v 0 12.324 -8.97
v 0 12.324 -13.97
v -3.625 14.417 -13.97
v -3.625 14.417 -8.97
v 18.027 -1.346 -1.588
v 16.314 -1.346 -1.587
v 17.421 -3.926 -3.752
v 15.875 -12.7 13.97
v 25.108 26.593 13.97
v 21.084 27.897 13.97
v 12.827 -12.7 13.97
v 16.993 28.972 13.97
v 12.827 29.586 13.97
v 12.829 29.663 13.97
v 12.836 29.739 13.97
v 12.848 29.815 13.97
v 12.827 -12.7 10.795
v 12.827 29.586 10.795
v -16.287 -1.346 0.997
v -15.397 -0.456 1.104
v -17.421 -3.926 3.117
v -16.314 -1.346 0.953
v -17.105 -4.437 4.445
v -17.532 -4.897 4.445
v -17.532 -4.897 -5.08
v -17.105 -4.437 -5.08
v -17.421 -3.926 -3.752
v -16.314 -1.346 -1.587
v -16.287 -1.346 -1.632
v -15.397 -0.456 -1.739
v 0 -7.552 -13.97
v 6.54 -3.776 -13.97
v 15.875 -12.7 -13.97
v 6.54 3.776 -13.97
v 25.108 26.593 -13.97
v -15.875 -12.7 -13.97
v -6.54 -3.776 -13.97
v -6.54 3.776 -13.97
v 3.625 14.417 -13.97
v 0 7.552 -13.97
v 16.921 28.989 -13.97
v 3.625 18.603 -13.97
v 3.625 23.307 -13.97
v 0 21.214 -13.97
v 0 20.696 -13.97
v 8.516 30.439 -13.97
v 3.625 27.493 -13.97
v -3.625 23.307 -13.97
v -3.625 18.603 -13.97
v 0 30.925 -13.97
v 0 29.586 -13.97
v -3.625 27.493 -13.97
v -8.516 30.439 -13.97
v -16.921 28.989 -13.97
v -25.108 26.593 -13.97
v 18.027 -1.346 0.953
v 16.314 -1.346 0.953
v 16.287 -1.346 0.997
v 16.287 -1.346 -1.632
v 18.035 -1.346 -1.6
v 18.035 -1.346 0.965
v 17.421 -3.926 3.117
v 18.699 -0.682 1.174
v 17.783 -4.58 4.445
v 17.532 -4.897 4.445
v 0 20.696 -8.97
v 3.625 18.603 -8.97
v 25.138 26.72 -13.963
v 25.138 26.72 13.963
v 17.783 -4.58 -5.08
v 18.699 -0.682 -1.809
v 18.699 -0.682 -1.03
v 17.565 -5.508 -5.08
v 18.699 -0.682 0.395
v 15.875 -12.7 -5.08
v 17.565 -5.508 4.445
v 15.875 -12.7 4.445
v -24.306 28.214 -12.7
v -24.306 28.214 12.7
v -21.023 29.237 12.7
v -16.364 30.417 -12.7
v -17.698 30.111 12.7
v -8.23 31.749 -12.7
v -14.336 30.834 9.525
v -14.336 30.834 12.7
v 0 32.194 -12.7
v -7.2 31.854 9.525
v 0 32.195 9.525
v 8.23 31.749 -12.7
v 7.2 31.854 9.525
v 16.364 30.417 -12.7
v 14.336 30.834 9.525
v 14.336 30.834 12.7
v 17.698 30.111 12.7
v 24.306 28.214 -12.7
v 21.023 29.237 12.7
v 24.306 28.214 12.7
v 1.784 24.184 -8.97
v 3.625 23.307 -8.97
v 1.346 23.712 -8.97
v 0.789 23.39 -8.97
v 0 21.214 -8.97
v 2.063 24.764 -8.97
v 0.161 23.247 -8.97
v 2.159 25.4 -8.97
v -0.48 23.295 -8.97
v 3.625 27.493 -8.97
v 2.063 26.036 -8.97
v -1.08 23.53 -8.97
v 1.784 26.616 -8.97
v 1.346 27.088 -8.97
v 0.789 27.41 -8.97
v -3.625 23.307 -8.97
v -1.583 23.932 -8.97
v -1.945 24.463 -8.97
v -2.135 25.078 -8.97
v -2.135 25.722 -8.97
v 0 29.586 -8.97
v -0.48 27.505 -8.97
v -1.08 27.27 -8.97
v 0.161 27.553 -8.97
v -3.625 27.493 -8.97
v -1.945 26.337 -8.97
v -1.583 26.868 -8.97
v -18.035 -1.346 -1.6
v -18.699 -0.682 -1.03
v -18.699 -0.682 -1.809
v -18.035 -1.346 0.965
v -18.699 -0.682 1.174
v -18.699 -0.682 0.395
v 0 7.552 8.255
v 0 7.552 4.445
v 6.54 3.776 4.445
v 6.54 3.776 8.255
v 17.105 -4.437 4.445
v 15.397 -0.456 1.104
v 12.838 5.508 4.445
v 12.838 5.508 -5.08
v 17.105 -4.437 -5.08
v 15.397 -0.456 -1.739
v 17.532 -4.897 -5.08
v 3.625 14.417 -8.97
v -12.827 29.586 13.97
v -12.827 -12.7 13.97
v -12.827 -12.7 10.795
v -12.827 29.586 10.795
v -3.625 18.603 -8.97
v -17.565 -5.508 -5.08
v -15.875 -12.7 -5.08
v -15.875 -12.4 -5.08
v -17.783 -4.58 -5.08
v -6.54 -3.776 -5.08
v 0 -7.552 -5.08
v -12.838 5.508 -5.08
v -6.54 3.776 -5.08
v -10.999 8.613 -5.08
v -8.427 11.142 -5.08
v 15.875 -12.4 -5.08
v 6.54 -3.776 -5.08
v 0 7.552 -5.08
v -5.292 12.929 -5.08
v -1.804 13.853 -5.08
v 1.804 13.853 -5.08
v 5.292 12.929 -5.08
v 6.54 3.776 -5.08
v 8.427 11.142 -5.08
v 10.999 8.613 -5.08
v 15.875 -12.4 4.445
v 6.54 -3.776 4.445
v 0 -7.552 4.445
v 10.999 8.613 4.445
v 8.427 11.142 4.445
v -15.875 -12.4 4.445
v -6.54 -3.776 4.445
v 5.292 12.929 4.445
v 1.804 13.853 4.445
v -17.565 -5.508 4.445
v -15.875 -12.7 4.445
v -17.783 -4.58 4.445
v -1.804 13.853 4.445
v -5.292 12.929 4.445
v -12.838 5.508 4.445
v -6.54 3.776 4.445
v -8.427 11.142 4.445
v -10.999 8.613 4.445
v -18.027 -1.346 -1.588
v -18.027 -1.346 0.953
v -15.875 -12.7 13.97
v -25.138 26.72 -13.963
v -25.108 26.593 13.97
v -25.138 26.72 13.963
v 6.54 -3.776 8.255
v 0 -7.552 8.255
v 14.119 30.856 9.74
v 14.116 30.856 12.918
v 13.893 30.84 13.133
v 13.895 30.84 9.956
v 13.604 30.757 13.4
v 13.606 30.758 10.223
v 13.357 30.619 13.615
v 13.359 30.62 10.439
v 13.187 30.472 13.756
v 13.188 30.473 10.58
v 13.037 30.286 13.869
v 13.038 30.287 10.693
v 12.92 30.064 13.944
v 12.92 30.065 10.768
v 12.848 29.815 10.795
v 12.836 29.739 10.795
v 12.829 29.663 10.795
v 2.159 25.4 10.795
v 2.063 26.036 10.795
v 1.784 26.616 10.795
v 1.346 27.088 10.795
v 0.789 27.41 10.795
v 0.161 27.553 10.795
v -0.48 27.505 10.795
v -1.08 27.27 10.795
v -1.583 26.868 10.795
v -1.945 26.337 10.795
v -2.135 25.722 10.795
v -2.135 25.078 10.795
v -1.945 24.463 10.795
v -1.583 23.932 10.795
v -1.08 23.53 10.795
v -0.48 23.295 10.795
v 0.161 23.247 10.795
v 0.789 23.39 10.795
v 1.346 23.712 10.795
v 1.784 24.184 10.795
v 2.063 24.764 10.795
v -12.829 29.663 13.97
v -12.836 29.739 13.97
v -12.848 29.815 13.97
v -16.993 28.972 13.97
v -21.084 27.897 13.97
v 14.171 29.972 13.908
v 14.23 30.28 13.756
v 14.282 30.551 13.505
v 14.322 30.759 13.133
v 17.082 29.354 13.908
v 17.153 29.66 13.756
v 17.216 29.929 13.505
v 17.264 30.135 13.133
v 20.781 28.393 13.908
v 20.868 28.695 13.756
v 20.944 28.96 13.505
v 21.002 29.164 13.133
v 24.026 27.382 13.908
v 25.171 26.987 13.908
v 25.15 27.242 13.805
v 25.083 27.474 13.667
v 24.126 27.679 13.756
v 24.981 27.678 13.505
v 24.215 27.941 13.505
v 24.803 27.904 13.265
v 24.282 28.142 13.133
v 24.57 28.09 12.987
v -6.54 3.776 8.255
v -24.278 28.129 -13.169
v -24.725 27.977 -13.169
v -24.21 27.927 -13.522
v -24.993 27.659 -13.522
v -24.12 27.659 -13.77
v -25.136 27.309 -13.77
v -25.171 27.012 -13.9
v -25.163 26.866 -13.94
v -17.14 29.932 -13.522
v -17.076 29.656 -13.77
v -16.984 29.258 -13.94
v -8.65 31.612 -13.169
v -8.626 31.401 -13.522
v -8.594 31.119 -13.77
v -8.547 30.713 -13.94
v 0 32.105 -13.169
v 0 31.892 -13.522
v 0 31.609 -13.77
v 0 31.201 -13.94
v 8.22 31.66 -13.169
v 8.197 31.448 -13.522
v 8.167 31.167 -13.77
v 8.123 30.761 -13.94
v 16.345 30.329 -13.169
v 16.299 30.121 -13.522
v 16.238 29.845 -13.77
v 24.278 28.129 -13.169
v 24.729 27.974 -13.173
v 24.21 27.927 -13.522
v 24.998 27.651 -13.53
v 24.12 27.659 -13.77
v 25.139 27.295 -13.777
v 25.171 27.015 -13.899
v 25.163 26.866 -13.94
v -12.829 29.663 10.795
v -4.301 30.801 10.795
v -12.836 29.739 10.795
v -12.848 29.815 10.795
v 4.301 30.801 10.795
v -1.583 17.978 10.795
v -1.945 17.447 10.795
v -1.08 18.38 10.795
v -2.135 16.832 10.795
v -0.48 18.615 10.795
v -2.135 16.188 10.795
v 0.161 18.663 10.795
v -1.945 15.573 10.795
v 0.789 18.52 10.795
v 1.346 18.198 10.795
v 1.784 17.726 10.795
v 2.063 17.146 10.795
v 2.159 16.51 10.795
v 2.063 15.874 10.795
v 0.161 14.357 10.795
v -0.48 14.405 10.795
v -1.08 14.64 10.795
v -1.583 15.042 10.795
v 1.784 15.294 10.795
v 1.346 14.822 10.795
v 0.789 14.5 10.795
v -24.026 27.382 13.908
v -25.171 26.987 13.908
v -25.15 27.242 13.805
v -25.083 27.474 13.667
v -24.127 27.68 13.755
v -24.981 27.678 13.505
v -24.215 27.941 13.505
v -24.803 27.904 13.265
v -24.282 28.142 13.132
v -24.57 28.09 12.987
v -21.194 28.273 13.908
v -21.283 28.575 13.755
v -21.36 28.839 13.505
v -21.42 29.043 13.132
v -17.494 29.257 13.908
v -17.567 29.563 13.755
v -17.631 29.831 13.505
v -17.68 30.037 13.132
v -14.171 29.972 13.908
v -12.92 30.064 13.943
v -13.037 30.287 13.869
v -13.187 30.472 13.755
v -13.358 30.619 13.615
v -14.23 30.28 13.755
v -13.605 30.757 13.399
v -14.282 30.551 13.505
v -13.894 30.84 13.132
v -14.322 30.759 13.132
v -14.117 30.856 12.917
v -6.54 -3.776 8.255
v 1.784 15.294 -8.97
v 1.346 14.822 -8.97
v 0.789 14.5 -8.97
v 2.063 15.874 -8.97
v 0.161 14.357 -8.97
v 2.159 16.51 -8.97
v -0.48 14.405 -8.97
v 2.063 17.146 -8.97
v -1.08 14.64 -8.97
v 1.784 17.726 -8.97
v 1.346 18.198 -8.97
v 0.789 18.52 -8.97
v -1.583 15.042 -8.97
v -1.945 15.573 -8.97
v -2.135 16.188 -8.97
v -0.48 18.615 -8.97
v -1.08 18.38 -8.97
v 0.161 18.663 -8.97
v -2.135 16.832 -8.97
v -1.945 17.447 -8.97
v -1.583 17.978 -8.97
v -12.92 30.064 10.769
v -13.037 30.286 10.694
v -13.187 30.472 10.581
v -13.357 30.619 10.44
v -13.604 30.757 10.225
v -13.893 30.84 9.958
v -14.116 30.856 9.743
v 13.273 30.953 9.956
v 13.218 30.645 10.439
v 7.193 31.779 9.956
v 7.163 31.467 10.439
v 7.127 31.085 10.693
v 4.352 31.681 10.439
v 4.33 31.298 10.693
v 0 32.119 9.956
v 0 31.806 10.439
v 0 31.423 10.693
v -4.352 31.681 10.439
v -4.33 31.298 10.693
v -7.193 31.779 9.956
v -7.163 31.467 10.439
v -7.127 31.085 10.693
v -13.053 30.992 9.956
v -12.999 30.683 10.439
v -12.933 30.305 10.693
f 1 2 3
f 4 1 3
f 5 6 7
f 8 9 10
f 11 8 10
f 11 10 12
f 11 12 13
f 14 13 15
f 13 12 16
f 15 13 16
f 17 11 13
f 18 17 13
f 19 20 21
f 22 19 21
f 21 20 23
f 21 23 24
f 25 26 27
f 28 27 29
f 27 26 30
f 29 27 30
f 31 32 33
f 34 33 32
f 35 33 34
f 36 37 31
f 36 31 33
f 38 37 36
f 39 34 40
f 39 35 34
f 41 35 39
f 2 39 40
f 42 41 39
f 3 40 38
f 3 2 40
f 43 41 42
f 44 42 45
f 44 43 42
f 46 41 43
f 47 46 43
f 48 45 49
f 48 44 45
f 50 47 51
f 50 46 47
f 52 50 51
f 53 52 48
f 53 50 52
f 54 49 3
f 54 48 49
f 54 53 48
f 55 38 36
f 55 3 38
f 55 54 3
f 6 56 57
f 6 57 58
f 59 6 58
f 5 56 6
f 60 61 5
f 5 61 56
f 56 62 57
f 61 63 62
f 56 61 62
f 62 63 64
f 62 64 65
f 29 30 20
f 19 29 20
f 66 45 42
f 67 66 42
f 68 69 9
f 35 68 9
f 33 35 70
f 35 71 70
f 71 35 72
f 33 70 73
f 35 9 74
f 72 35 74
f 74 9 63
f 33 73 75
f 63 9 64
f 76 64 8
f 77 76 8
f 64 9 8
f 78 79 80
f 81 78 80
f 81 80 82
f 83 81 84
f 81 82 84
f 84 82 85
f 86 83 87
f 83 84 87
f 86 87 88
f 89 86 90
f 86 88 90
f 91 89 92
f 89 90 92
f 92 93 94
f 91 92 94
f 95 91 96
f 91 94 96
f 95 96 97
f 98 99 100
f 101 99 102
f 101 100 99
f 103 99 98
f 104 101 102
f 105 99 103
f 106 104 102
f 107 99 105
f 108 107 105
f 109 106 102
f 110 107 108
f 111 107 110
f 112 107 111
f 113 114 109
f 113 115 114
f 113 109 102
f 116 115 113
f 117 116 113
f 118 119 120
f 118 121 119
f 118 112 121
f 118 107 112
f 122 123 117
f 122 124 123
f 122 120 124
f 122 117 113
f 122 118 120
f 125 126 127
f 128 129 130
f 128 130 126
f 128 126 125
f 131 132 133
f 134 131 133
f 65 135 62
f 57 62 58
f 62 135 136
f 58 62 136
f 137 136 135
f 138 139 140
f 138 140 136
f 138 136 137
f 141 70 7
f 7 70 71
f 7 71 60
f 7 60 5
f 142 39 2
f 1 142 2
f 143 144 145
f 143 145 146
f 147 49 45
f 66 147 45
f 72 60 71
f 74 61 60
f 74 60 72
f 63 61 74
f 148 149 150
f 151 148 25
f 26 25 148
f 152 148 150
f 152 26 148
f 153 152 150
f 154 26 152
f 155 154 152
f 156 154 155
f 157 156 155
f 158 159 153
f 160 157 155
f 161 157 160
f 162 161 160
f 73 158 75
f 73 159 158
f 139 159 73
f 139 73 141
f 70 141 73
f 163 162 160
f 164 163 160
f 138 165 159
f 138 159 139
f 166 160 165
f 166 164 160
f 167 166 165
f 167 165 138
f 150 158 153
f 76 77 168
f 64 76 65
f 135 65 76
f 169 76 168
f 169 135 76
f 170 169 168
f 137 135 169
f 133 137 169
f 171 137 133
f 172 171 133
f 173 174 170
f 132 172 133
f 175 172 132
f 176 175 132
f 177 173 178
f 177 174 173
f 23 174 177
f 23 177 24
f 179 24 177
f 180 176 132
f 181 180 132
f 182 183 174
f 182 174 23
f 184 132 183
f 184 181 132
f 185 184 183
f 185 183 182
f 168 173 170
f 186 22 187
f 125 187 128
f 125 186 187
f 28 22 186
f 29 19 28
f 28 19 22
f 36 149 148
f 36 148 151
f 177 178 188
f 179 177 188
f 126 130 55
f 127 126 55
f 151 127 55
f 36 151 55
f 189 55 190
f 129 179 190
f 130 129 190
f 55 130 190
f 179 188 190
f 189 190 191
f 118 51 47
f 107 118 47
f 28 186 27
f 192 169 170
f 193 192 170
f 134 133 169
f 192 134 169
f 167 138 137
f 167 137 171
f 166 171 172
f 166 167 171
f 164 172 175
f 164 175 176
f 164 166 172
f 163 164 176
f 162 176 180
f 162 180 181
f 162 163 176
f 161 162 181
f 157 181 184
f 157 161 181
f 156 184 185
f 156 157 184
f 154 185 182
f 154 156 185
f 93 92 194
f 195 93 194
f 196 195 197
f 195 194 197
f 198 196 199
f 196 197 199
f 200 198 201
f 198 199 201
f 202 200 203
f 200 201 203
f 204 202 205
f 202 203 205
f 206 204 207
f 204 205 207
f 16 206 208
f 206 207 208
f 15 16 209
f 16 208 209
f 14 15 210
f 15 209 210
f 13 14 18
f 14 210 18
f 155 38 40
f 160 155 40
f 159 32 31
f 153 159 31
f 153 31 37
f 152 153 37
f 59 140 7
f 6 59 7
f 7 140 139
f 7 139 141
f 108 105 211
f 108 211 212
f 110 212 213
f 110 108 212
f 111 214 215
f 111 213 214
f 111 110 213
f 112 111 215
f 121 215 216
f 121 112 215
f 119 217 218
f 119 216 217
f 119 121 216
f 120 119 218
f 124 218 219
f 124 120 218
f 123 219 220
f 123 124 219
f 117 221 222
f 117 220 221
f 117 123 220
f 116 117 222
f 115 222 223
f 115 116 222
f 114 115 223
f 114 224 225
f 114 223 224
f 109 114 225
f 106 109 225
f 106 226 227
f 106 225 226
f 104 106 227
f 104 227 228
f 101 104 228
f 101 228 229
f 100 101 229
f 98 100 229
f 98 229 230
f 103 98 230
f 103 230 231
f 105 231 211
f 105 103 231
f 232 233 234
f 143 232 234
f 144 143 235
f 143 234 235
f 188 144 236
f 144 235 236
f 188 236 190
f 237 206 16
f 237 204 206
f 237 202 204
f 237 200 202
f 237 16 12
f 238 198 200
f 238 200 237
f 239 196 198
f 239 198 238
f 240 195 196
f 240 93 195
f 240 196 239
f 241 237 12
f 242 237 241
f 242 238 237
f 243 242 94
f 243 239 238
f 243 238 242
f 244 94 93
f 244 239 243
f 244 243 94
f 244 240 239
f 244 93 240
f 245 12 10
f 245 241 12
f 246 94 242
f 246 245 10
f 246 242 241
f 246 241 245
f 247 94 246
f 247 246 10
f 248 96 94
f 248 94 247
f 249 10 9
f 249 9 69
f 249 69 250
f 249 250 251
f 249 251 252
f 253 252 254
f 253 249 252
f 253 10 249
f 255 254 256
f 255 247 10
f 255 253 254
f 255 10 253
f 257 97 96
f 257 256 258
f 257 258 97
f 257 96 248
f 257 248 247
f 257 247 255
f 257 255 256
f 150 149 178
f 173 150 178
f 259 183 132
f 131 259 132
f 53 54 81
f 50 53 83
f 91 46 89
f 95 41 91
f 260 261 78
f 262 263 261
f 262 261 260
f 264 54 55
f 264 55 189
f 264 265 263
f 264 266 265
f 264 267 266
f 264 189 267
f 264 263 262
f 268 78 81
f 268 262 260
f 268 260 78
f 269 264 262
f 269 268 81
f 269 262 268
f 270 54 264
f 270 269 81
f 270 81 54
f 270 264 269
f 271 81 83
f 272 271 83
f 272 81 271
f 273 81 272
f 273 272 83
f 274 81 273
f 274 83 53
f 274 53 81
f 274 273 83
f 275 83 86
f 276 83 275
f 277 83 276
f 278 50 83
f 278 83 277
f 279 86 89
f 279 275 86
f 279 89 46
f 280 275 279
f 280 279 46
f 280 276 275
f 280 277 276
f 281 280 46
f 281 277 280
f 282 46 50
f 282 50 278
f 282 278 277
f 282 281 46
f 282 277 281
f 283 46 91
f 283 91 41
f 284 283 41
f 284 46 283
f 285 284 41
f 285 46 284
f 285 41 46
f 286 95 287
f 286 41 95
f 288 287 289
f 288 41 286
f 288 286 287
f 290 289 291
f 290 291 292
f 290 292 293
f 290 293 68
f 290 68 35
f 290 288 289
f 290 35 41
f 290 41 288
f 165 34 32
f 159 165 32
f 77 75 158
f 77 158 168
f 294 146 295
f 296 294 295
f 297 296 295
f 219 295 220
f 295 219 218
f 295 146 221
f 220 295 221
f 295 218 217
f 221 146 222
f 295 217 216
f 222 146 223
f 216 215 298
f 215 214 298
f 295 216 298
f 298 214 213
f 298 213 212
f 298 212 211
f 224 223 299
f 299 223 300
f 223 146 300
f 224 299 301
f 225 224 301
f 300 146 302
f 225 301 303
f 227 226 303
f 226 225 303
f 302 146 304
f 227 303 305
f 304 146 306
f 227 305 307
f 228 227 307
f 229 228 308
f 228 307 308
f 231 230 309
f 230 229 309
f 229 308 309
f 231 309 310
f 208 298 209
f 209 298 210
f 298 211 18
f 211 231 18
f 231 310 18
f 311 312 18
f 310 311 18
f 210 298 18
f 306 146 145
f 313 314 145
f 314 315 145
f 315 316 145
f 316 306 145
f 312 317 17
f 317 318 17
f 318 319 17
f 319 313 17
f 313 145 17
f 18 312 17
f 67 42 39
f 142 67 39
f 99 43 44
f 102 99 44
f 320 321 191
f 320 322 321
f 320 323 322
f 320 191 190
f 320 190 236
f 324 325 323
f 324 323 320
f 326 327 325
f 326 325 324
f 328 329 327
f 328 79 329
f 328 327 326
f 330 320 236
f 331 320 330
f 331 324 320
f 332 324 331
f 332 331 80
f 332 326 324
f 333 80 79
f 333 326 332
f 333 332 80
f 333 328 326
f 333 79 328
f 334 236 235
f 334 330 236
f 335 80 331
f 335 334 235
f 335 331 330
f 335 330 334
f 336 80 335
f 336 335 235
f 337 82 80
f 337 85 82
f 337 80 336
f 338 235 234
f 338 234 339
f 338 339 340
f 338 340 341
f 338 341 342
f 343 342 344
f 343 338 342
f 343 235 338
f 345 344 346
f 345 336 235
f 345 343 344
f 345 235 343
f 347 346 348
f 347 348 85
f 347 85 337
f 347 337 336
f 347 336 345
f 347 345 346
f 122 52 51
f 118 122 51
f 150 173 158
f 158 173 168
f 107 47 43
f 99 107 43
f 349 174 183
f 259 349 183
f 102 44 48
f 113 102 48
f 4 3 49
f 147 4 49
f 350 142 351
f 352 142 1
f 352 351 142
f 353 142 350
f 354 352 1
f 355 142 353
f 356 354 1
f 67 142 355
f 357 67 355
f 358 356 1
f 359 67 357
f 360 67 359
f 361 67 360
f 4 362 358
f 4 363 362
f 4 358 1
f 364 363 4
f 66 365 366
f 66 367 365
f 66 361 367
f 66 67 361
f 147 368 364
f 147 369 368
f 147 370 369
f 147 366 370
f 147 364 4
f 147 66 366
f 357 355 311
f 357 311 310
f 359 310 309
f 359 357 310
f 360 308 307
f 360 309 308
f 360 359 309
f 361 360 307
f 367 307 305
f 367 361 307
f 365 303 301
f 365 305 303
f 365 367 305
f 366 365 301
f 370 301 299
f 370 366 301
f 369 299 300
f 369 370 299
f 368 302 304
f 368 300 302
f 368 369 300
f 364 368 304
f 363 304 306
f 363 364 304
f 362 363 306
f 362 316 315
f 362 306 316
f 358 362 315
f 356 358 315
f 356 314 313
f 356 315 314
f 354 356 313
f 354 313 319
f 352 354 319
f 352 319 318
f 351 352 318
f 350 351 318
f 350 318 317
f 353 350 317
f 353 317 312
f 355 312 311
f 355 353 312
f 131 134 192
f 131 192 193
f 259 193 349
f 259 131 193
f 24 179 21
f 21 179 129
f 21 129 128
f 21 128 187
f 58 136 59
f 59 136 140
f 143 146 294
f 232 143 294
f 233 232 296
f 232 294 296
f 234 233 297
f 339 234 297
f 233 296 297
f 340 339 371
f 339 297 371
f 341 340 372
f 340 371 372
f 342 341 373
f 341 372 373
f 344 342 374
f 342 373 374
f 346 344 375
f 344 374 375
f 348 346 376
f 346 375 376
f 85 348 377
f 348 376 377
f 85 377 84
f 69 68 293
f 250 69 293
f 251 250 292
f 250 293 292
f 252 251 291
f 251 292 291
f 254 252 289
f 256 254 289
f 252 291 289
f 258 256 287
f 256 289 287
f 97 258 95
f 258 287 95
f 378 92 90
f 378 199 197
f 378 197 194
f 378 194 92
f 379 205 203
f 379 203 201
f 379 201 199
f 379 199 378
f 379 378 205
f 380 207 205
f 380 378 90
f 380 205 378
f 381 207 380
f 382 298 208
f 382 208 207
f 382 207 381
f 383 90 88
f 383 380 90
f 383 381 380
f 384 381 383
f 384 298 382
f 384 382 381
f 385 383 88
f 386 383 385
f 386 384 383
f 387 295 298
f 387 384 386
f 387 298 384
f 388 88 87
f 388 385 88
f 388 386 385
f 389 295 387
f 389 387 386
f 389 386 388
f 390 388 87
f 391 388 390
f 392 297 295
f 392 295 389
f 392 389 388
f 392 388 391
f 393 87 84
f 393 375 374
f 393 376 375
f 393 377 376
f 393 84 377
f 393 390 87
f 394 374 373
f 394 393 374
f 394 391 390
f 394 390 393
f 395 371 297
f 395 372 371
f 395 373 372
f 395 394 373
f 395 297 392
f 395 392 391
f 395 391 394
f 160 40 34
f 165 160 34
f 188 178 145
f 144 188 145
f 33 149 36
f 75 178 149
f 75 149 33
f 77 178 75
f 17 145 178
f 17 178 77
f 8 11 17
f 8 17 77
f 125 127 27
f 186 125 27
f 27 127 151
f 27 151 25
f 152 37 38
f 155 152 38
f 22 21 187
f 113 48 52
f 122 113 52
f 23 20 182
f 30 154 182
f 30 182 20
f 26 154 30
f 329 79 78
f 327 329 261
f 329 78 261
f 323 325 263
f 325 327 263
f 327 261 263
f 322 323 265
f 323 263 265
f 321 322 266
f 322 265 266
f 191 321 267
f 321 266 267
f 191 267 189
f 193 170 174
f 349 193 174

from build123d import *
from OCP.BRepFilletAPI import BRepFilletAPI_MakeChamfer

# Parameters (mm, degrees)
BOSS_EXTRUDE1_DEPTH     = 13.97
SKETCH5_W               = 25.654
SKETCH5_H               = 76.2
CUT_EXTRUDE3_DEPTH      = 3.175
CUT_EXTRUDE5_DEPTH      = 48.905647425
CUT_EXTRUDE5_DEPTH_BACK = 48.905647425
SKETCH8_R               = 2.159
SKETCH6_W               = 9.525
SKETCH6_H               = 13.97
CUT_EXTRUDE4_DEPTH      = 9.525
CUT_EXTRUDE1_DEPTH      = 22.225
CUT_EXTRUDE6_DEPTH      = 5
CUT_EXTRUDE8_DEPTH      = 44.32212749
CUT_EXTRUDE8_DEPTH_BACK = 44.32212749
CHAMFER1_SIZE           = 0.682114001
CHAMFER1_SIZE_2         = 0.508
CHAMFER1_SIZE_3         = 0.603255048
CHAMFER2_SIZE           = 0.508
CHAMFER2_SIZE2          = 0.71158035
CHAMFER2_SIZE2_2        = 0.968183523
FILLET2_R               = 1.27
SKETCH11_W              = 31.75
SKETCH11_H              = 9.525
BOSS_EXTRUDE3_DEPTH     = 0.3


with BuildPart() as part:
    # Sketch1 → Boss-Extrude1 (new, symmetric)
    with BuildSketch(Plane.XY):
        with BuildLine():
            Line((-15.875, -12.7), (-25.4, 27.836548969))
            ThreePointArc((-25.4, 27.836548969), (0, 32.1945), (25.4, 27.836548969))
            Line((25.4, 27.836548969), (15.875, -12.7))
            Line((15.875, -12.7), (-15.875, -12.7))
        make_face()
    extrude(amount=BOSS_EXTRUDE1_DEPTH, both=True)

    # Sketch5 → Cut-Extrude3 (cut)
    with BuildSketch(Plane.XY.offset(13.97)):
        with Locations((0, 25.4)):
            Rectangle(SKETCH5_W, SKETCH5_H)
    extrude(amount=-CUT_EXTRUDE3_DEPTH, mode=Mode.SUBTRACT)

    # Sketch8 → Cut-Extrude5 (cut, two sides: drawn at the far end of the back side and taken through both)
    with BuildSketch(Plane.XY.offset(10.795).offset(-CUT_EXTRUDE5_DEPTH_BACK)):
        with Locations((0, 16.51)):
            Circle(SKETCH8_R)
        with Locations((0, 25.4)):
            Circle(SKETCH8_R)
    extrude(amount=CUT_EXTRUDE5_DEPTH + CUT_EXTRUDE5_DEPTH_BACK, mode=Mode.SUBTRACT)

    # Sketch6 → Cut-Revolve2 (revolve, cut)
    with BuildSketch(Plane(origin=(0, 0, 0), x_dir=(0, 0, -1), z_dir=(1, 0, 0))):
        with Locations((0.3175, 6.985)):
            Rectangle(SKETCH6_W, SKETCH6_H)
    revolve(axis=Axis((0, 0, 20.955), (0, 0, -1)), mode=Mode.SUBTRACT)

    # Sketch7 → Cut-Extrude4 (cut)
    with BuildSketch(Plane(origin=(0, 0, -5.08), x_dir=(-1, 0, 0), z_dir=(0, 0, -1))):
        with BuildLine():
            Line((12.838226341, 5.508252391), (17.564867483, -5.508252391))
            Line((17.564867483, -5.508252391), (15.875, -12.7))
            Line((15.875, -12.7), (-15.875, -12.7))
            Line((-15.875, -12.7), (-17.564867483, -5.508252391))
            Line((-17.564867483, -5.508252391), (-12.838226341, 5.508252391))
            ThreePointArc((-12.838226341, 5.508252391), (0, 13.97), (12.838226341, 5.508252391))
        make_face()
    extrude(amount=-CUT_EXTRUDE4_DEPTH, mode=Mode.SUBTRACT)

    # Sketch3 → Cut-Extrude1 (cut)
    with BuildSketch(Plane(origin=(0, 0, -13.97), x_dir=(-1, 0, 0), z_dir=(0, 0, -1))):
        Polygon((6.5405, -3.776159436), (6.5405, 3.776159436), (0, 7.552318871), (-6.5405, 3.776159436), (-6.5405, -3.776159436), (0, -7.552318871), align=None)
    extrude(amount=-CUT_EXTRUDE1_DEPTH, mode=Mode.SUBTRACT)

    # Sketch9 → Cut-Extrude6 (cut)
    with BuildSketch(Plane(origin=(0, 0, -13.97), x_dir=(-1, 0, 0), z_dir=(0, 0, -1))):
        Polygon((3.625, 23.307105274), (3.625, 27.492894726), (0, 29.585789452), (-3.625, 27.492894726), (-3.625, 23.307105274), (0, 21.214210548), align=None)
        Polygon((3.625, 18.602894726), (0, 20.695789452), (-3.625, 18.602894726), (-3.625, 14.417105274), (0, 12.324210548), (3.625, 14.417105274), align=None)
    extrude(amount=-CUT_EXTRUDE6_DEPTH, mode=Mode.SUBTRACT)

    # Sketch10 → Cut-Extrude8 (cut, two sides: drawn at the far end of the back side and taken through both)
    with BuildSketch(Plane(origin=(0, 0, 0), x_dir=(0, 0, -1), z_dir=(1, 0, 0)).offset(-CUT_EXTRUDE8_DEPTH_BACK)):
        Polygon((-4.445, -5.508252391), (-0.9525, -1.346052969), (1.5875, -1.346052969), (5.08, -5.508252391), align=None)
    extrude(amount=CUT_EXTRUDE8_DEPTH + CUT_EXTRUDE8_DEPTH_BACK, mode=Mode.SUBTRACT)

    # Chamfer1
    # the kernel refuses this chamfer: 0.682114001, 0.603255048, 0.508 mm, written as the material it takes off along each edge
    with BuildSketch(Plane(origin=(-18.54287253, -1.346052969, -3.351137705), x_dir=(-0.24852335816266743, 0.968625903250347, 0), z_dir=(0, 0, 1))) as chamfer1_piece_1_section:
        Polygon((CHAMFER1_SIZE * 0.999792559209, -CHAMFER1_SIZE * 0.0203675757071), (-CHAMFER1_SIZE_2 * 0.248523358163, -CHAMFER1_SIZE_2 * 0.96862590325), (0, 0), align=None)
    chamfer1_piece_1 = extrude(amount=6.06727541, mode=Mode.PRIVATE)
    chamfer1_piece_1 = split(chamfer1_piece_1, bisect_by=Plane(origin=(-18.413842957, -0.601935265, 0.328111109), z_dir=(0, -0.642787609686538, -0.7660444431189792)), keep=Keep.TOP, mode=Mode.PRIVATE)
    chamfer1_piece_1 = split(chamfer1_piece_1, bisect_by=Plane(origin=(-18.413842957, -0.601935265, -0.963111109), z_dir=(0, -0.6427876096865379, 0.7660444431189793)), keep=Keep.TOP, mode=Mode.PRIVATE)
    add(chamfer1_piece_1, mode=Mode.SUBTRACT)
    with BuildSketch(Plane(origin=(18.54287253, -1.346052969, 2.716137705), x_dir=(0.2485233581626668, 0.968625903250347, 0), z_dir=(0, 0, -1))) as chamfer1_piece_2_section:
        Polygon((CHAMFER1_SIZE * 0.999792559209, -CHAMFER1_SIZE * 0.0203675757071), (-CHAMFER1_SIZE_2 * 0.248523358163, -CHAMFER1_SIZE_2 * 0.96862590325), (0, 0), align=None)
    chamfer1_piece_2 = extrude(amount=6.06727541, mode=Mode.PRIVATE)
    chamfer1_piece_2 = split(chamfer1_piece_2, bisect_by=Plane(origin=(18.413842957, -0.601935265, -0.963111109), z_dir=(0, -0.6427876096865379, 0.7660444431189793)), keep=Keep.TOP, mode=Mode.PRIVATE)
    chamfer1_piece_2 = split(chamfer1_piece_2, bisect_by=Plane(origin=(18.413842957, -0.601935265, 0.328111109), z_dir=(0, -0.642787609686538, -0.7660444431189792)), keep=Keep.TOP, mode=Mode.PRIVATE)
    add(chamfer1_piece_2, mode=Mode.SUBTRACT)
    # the kernel refuses this chamfer: 0.682114001, 0.603255048, 0.508 mm, written as the material it takes off along each edge
    with BuildSketch(Plane(origin=(-18.974731516, 0.491854947, -0.589687854), x_dir=(-0.16712797510609614, 0.6104069372998713, 0.774255520376269), z_dir=(0.1771528691217366, -0.753928184154646, 0.6326208612583173))) as chamfer1_2_piece_1_section:
        Polygon((CHAMFER1_SIZE_3 * 0.999733841967, -CHAMFER1_SIZE_3 * 0.0230704135301), (-CHAMFER1_SIZE_2 * 0.169813861997, -CHAMFER1_SIZE_2 * 0.985476155101), (0, 0), align=None)
    chamfer1_2_piece_1 = extrude(amount=9.515476986, mode=Mode.PRIVATE)
    chamfer1_2_piece_1 = split(chamfer1_2_piece_1, bisect_by=Plane(origin=(-18.030163658, -1.346052969, 0.957818648), z_dir=(0, -1, 0)), keep=Keep.TOP, mode=Mode.PRIVATE)
    chamfer1_2_piece_1 = split(chamfer1_2_piece_1, bisect_by=Plane(origin=(-18.030163658, -1.348720845, 4.445), z_dir=(0, 0, -1)), keep=Keep.TOP, mode=Mode.PRIVATE)
    add(chamfer1_2_piece_1, mode=Mode.SUBTRACT)
    with BuildSketch(Plane(origin=(-18.974731516, 0.491854947, -0.589687854), x_dir=(-0.16712797510609614, 0.6104069372998713, 0.774255520376269), z_dir=(0.1771528691217366, -0.753928184154646, 0.6326208612583173))) as chamfer1_2_piece_2_section:
        Polygon((CHAMFER1_SIZE_3 * 0.999733841967, -CHAMFER1_SIZE_3 * 0.0230704135301), (-CHAMFER1_SIZE_2 * 0.169813861997, -CHAMFER1_SIZE_2 * 0.985476155101), (0, 0), align=None)
    chamfer1_2_piece_2 = extrude(amount=9.515476986, mode=Mode.PRIVATE)
    chamfer1_2_piece_2 = split(chamfer1_2_piece_2, bisect_by=Plane(origin=(-18.378233005, -1.002692494, 1.0369902), z_dir=(-0.7071067811865488, -0.7071067811865464, 0)), keep=Keep.TOP, mode=Mode.PRIVATE)
    chamfer1_2_piece_2 = split(chamfer1_2_piece_2, bisect_by=Plane(origin=(-18.473233886, -1.097693375, 4.445), z_dir=(0, 0, -1)), keep=Keep.TOP, mode=Mode.PRIVATE)
    add(chamfer1_2_piece_2, mode=Mode.SUBTRACT)
    with BuildSketch(Plane(origin=(17.289037466, -6.682131338, 5.430001392), x_dir=(0.16712797510609612, 0.6104069372998716, 0.7742555203762688), z_dir=(0.1771528691217377, 0.7539281841546455, -0.6326208612583175))) as chamfer1_2_piece_3_section:
        Polygon((CHAMFER1_SIZE_3 * 0.999733841967, -CHAMFER1_SIZE_3 * 0.0230704135301), (-CHAMFER1_SIZE_2 * 0.169813861997, -CHAMFER1_SIZE_2 * 0.985476155101), (0, 0), align=None)
    chamfer1_2_piece_3 = extrude(amount=9.515476986, mode=Mode.PRIVATE)
    chamfer1_2_piece_3 = split(chamfer1_2_piece_3, bisect_by=Plane(origin=(17.932422067, -3.21764052, 4.445), z_dir=(0, 0, -1)), keep=Keep.TOP, mode=Mode.PRIVATE)
    chamfer1_2_piece_3 = split(chamfer1_2_piece_3, bisect_by=Plane(origin=(17.047853524, -2.333071976, 2.777240675), z_dir=(0.7071067811865496, -0.7071067811865455, 0)), keep=Keep.TOP, mode=Mode.PRIVATE)
    add(chamfer1_2_piece_3, mode=Mode.SUBTRACT)
    with BuildSketch(Plane(origin=(17.289037466, -6.682131338, 5.430001392), x_dir=(0.16712797510609612, 0.6104069372998716, 0.7742555203762688), z_dir=(0.1771528691217377, 0.7539281841546455, -0.6326208612583175))) as chamfer1_2_piece_4_section:
        Polygon((CHAMFER1_SIZE_3 * 0.999733841967, -CHAMFER1_SIZE_3 * 0.0230704135301), (-CHAMFER1_SIZE_2 * 0.169813861997, -CHAMFER1_SIZE_2 * 0.985476155101), (0, 0), align=None)
    chamfer1_2_piece_4 = extrude(amount=9.515476986, mode=Mode.PRIVATE)
    chamfer1_2_piece_4 = split(chamfer1_2_piece_4, bisect_by=Plane(origin=(18.030163658, -1.346052969, 0.957818648), z_dir=(0, -1, 0)), keep=Keep.TOP, mode=Mode.PRIVATE)
    chamfer1_2_piece_4 = split(chamfer1_2_piece_4, bisect_by=Plane(origin=(18.031184156, -1.349741343, 0.957818648), z_dir=(-0.7071067811865496, 0.7071067811865455, 0)), keep=Keep.TOP, mode=Mode.PRIVATE)
    add(chamfer1_2_piece_4, mode=Mode.SUBTRACT)
    with BuildSketch(Plane(origin=(-17.289037466, -6.682131338, -6.065001392), x_dir=(-0.16712797510609537, 0.6104069372998713, -0.7742555203762692), z_dir=(-0.17715286912173667, 0.7539281841546462, 0.6326208612583171))) as chamfer1_2_piece_5_section:
        Polygon((CHAMFER1_SIZE_3 * 0.999733841967, -CHAMFER1_SIZE_3 * 0.0230704135301), (-CHAMFER1_SIZE_2 * 0.169813861997, -CHAMFER1_SIZE_2 * 0.985476155101), (0, 0), align=None)
    chamfer1_2_piece_5 = extrude(amount=9.515476986, mode=Mode.PRIVATE)
    chamfer1_2_piece_5 = split(chamfer1_2_piece_5, bisect_by=Plane(origin=(-17.932422067, -1.346052969, -3.412240675), z_dir=(0, -1, 0)), keep=Keep.TOP, mode=Mode.PRIVATE)
    chamfer1_2_piece_5 = split(chamfer1_2_piece_5, bisect_by=Plane(origin=(-17.932422067, -3.21764052, -5.08), z_dir=(0, 0, 1)), keep=Keep.TOP, mode=Mode.PRIVATE)
    add(chamfer1_2_piece_5, mode=Mode.SUBTRACT)
    with BuildSketch(Plane(origin=(-17.289037466, -6.682131338, -6.065001392), x_dir=(-0.16712797510609537, 0.6104069372998713, -0.7742555203762692), z_dir=(-0.17715286912173667, 0.7539281841546462, 0.6326208612583171))) as chamfer1_2_piece_6_section:
        Polygon((CHAMFER1_SIZE_3 * 0.999733841967, -CHAMFER1_SIZE_3 * 0.0230704135301), (-CHAMFER1_SIZE_2 * 0.169813861997, -CHAMFER1_SIZE_2 * 0.985476155101), (0, 0), align=None)
    chamfer1_2_piece_6 = extrude(amount=9.515476986, mode=Mode.PRIVATE)
    chamfer1_2_piece_6 = split(chamfer1_2_piece_6, bisect_by=Plane(origin=(-18.378233005, -1.002692494, -1.6719902), z_dir=(-0.7071067811865488, -0.7071067811865464, 0)), keep=Keep.TOP, mode=Mode.PRIVATE)
    chamfer1_2_piece_6 = split(chamfer1_2_piece_6, bisect_by=Plane(origin=(-18.473233886, -1.097693375, -5.08), z_dir=(0, 0, 1)), keep=Keep.TOP, mode=Mode.PRIVATE)
    add(chamfer1_2_piece_6, mode=Mode.SUBTRACT)
    with BuildSketch(Plane(origin=(18.974731516, 0.491854947, -0.045312146), x_dir=(0.16712797510609612, 0.610406937299871, -0.774255520376269), z_dir=(-0.17715286912173778, -0.7539281841546458, -0.6326208612583172))) as chamfer1_2_piece_7_section:
        Polygon((CHAMFER1_SIZE_3 * 0.999733841967, -CHAMFER1_SIZE_3 * 0.0230704135301), (-CHAMFER1_SIZE_2 * 0.169813861997, -CHAMFER1_SIZE_2 * 0.985476155101), (0, 0), align=None)
    chamfer1_2_piece_7 = extrude(amount=9.515476986, mode=Mode.PRIVATE)
    chamfer1_2_piece_7 = split(chamfer1_2_piece_7, bisect_by=Plane(origin=(18.030163658, -1.346052969, -1.592818648), z_dir=(0, -1, 0)), keep=Keep.TOP, mode=Mode.PRIVATE)
    chamfer1_2_piece_7 = split(chamfer1_2_piece_7, bisect_by=Plane(origin=(18.030163658, -1.348720845, -5.08), z_dir=(0, 0, 1)), keep=Keep.TOP, mode=Mode.PRIVATE)
    add(chamfer1_2_piece_7, mode=Mode.SUBTRACT)
    with BuildSketch(Plane(origin=(18.974731516, 0.491854947, -0.045312146), x_dir=(0.16712797510609612, 0.610406937299871, -0.774255520376269), z_dir=(-0.17715286912173778, -0.7539281841546458, -0.6326208612583172))) as chamfer1_2_piece_8_section:
        Polygon((CHAMFER1_SIZE_3 * 0.999733841967, -CHAMFER1_SIZE_3 * 0.0230704135301), (-CHAMFER1_SIZE_2 * 0.169813861997, -CHAMFER1_SIZE_2 * 0.985476155101), (0, 0), align=None)
    chamfer1_2_piece_8 = extrude(amount=9.515476986, mode=Mode.PRIVATE)
    chamfer1_2_piece_8 = split(chamfer1_2_piece_8, bisect_by=Plane(origin=(18.378233005, -1.002692494, -1.6719902), z_dir=(0.7071067811865496, -0.7071067811865455, 0)), keep=Keep.TOP, mode=Mode.PRIVATE)
    chamfer1_2_piece_8 = split(chamfer1_2_piece_8, bisect_by=Plane(origin=(18.473233886, -1.097693375, -5.08), z_dir=(0, 0, 1)), keep=Keep.TOP, mode=Mode.PRIVATE)
    add(chamfer1_2_piece_8, mode=Mode.SUBTRACT)

    # Chamfer2: one chamfer whose edges measure the first distance from different faces: ONE call of the kernel's chamfer builder (chamfer() names one face for all edges)
    chamfer2_edges_1 = [part.edges().sort_by_distance(p)[0] for p in [
        (-16.505213328, -3.03848904, 2.372622483),
    ]]
    chamfer2_side_1 = [part.faces().sort_by_distance(p)[0] for p in [
        (-17.0123784, -2.474343683, 1.899248322),
    ]]
    chamfer2_edges_2 = [part.edges().sort_by_distance(p)[0] for p in [
        (-15.779072132, -1.346052969, -0.3175),
    ]]
    chamfer2_side_2 = [part.faces().sort_by_distance(p)[0] for p in [
        (-16.906992082, -1.346052969, -0.3175),
    ]]
    chamfer2_edges_3 = [part.edges().sort_by_distance(p)[0] for p in [
        (-16.505213328, -3.03848904, -3.007622483),
    ]]
    chamfer2_side_3 = [part.faces().sort_by_distance(p)[0] for p in [
        (-17.0123784, -2.474343683, -2.534248322),
    ]]
    chamfer2_edges_4 = [part.edges().sort_by_distance(p)[0] for p in [
        (16.505213328, -3.03848904, 2.372622483),
    ]]
    chamfer2_side_4 = [part.faces().sort_by_distance(p)[0] for p in [
        (17.0123784, -2.474343683, 1.899248322),
    ]]
    chamfer2_edges_5 = [part.edges().sort_by_distance(p)[0] for p in [
        (15.779072132, -1.346052969, -0.3175),
    ]]
    chamfer2_side_5 = [part.faces().sort_by_distance(p)[0] for p in [
        (16.906992082, -1.346052969, -0.3175),
    ]]
    chamfer2_edges_6 = [part.edges().sort_by_distance(p)[0] for p in [
        (16.505213328, -3.03848904, -3.007622483),
    ]]
    chamfer2_side_6 = [part.faces().sort_by_distance(p)[0] for p in [
        (17.0123784, -2.474343683, -2.534248322),
    ]]
    chamfer2 = BRepFilletAPI_MakeChamfer(part.part.solid().wrapped)
    for e in chamfer2_edges_1:
        chamfer2.Add(CHAMFER2_SIZE, CHAMFER2_SIZE2, e.wrapped, chamfer2_side_1[0].wrapped)  # the first distance lies on this face
    for e in chamfer2_edges_2:
        chamfer2.Add(CHAMFER2_SIZE, CHAMFER2_SIZE2_2, e.wrapped, chamfer2_side_2[0].wrapped)  # the first distance lies on this face
    for e in chamfer2_edges_3:
        chamfer2.Add(CHAMFER2_SIZE, CHAMFER2_SIZE2, e.wrapped, chamfer2_side_3[0].wrapped)  # the first distance lies on this face
    for e in chamfer2_edges_4:
        chamfer2.Add(CHAMFER2_SIZE, CHAMFER2_SIZE2, e.wrapped, chamfer2_side_4[0].wrapped)  # the first distance lies on this face
    for e in chamfer2_edges_5:
        chamfer2.Add(CHAMFER2_SIZE, CHAMFER2_SIZE2_2, e.wrapped, chamfer2_side_5[0].wrapped)  # the first distance lies on this face
    for e in chamfer2_edges_6:
        chamfer2.Add(CHAMFER2_SIZE, CHAMFER2_SIZE2, e.wrapped, chamfer2_side_6[0].wrapped)  # the first distance lies on this face
    add(Compound.cast(chamfer2.Shape()), mode=Mode.REPLACE)

    # Fillet2
    # the kernel refuses this fillet: 1.27 mm, written as the material it takes off along each edge
    with BuildSketch(Plane(origin=(0, -44.0055, 13.97), x_dir=(-0.37231655097771355, 0.9281058053196627, 0), z_dir=(-0.9281058053196627, -0.37231655097771355, 0))) as fillet2_piece_1:
        with BuildLine():
            CenterArc((76.2 - FILLET2_R, FILLET2_R), FILLET2_R, 270, 90)
            Line((76.2 - FILLET2_R, 0), (76.2, 0))
            Line((76.2, 0), (76.2, FILLET2_R))
        make_face()
    revolve(axis=Axis((0, -44.0055, 13.97), (0, 0, -1)), revolution_arc=14.554961915, mode=Mode.SUBTRACT)
    with BuildSketch(Plane(origin=(12.827, 31.107135894, 10.795), x_dir=(0.9839864121726662, -0.17824348700461348, 0), z_dir=(0, 0, 1))) as fillet2_piece_2:
        with BuildLine():
            CenterArc((1.520709788, -1.269935705), FILLET2_R, 89.423465076, 100.843999504)
            Line((0.271047045, -1.496304934), (0, 0))
            ThreePointArc((0, 0), (0.766744431, 0.00385769), (1.533488862, 0))
        make_face()
    extrude(amount=7.008722155, mode=Mode.SUBTRACT)
    with BuildSketch(Plane(origin=(-12.827, 31.107135894, 10.795), x_dir=(-0.983986412172668, -0.17824348700460368, 0), z_dir=(0, 0, 1))) as fillet2_piece_3:
        with BuildLine():
            CenterArc((1.520709788, 1.269935705), FILLET2_R, 169.73253542, 100.843999504)
            Line((0.271047045, 1.496304934), (0, 0))
            ThreePointArc((0, 0), (0.766744431, -0.00385769), (1.533488862, 0))
        make_face()
    extrude(amount=7.008722155, mode=Mode.SUBTRACT)
    with BuildSketch(Plane(origin=(0, -44.0055, 10.795), x_dir=(0.20924819614640747, 0.9778625631495843, 0), z_dir=(0.9778625631495843, -0.20924819614640747, 0))) as fillet2_piece_4_section:
        with BuildLine():
            CenterArc((76.2 - FILLET2_R, -FILLET2_R), FILLET2_R, 0, 90)
            Line((76.2 - FILLET2_R, 0), (76.2, 0))
            Line((76.2, 0), (76.2, -FILLET2_R))
        make_face()
    fillet2_piece_4 = revolve(axis=Axis((0, -44.0055, 10.795), (0, 0, 1)), revolution_arc=24.156596533, mode=Mode.PRIVATE)
    fillet2_piece_4 = split(fillet2_piece_4, bisect_by=Plane(origin=(-12.827, 31.838059606, 10.438559606), z_dir=(1, 0, 0)), keep=Keep.TOP, mode=Mode.PRIVATE)
    fillet2_piece_4 = split(fillet2_piece_4, bisect_by=Plane(origin=(12.827, 31.838059606, 10.438559606), z_dir=(-1, 0, 0)), keep=Keep.TOP, mode=Mode.PRIVATE)
    add(fillet2_piece_4, mode=Mode.SUBTRACT)
    with BuildSketch(Plane(origin=(0, -44.0055, 13.97), x_dir=(0.12712683029566407, 0.9918864698235265, 0), z_dir=(-0.9918864698235265, 0.12712683029566407, 0))) as fillet2_piece_5:
        with BuildLine():
            CenterArc((76.2 - FILLET2_R, FILLET2_R), FILLET2_R, 270, 90)
            Line((76.2 - FILLET2_R, 0), (76.2, 0))
            Line((76.2, 0), (76.2, FILLET2_R))
        make_face()
    revolve(axis=Axis((0, -44.0055, 13.97), (0, 0, -1)), revolution_arc=14.554961915, mode=Mode.SUBTRACT)
    with BuildSketch(Plane(origin=(0, -44.0055, -13.97), x_dir=(-0.37231927534086834, 0.9281047124164659, 0), z_dir=(-0.9281047124164659, -0.37231927534086834, 0))) as fillet2_piece_6:
        with BuildLine():
            CenterArc((76.2 - FILLET2_R, -FILLET2_R), FILLET2_R, 0, 90)
            Line((76.2, -FILLET2_R), (76.2, 0))
            Line((76.2, 0), (76.2 - FILLET2_R, 0))
        make_face()
    revolve(axis=Axis((0, -44.0055, -13.97), (0, 0, -1)), revolution_arc=43.717448578, mode=Mode.SUBTRACT)
    with BuildSketch(Plane(origin=(25.4, 27.836548969, -16.862281293), x_dir=(-0.22874324291129688, -0.9734867892387772, 0), z_dir=(0, 0, 1))) as fillet2_piece_7:
        with BuildLine():
            CenterArc((1.147231071, -1.27), FILLET2_R, 90, 84.621777916)
            ThreePointArc((-0.117177961, -1.150963031), (-0.060773335, -0.575259129), (0, 0))
            Line((0, 0), (1.147231071, 0))
        make_face()
    extrude(amount=33.724562586, mode=Mode.SUBTRACT)
    with BuildSketch(Plane(origin=(-25.4, 27.836548969, -16.862281293), x_dir=(0.22874324291129516, -0.9734867892387776, 0), z_dir=(0, 0, 1))) as fillet2_piece_8:
        with BuildLine():
            CenterArc((1.147231071, 1.27), FILLET2_R, 185.378222084, 84.621777916)
            ThreePointArc((-0.117177961, 1.150963031), (-0.060773335, 0.575259129), (0, 0))
            Line((0, 0), (1.147231071, 0))
        make_face()
    extrude(amount=33.724562586, mode=Mode.SUBTRACT)
    with BuildSketch(Plane(origin=(0, -44.0055, 10.795), x_dir=(0.20924819614640747, 0.9778625631495843, 0), z_dir=(0.9778625631495843, -0.20924819614640747, 0))) as fillet2_piece_9a_section:
        with BuildLine():
            CenterArc((76.2 - FILLET2_R, -FILLET2_R), FILLET2_R, 0, 90)
            Line((76.2 - FILLET2_R, 0), (76.2, 0))
            Line((76.2, 0), (76.2, -FILLET2_R))
        make_face()
    fillet2_piece_9a = revolve(axis=Axis((0, -44.0055, 10.795), (0, 0, 1)), revolution_arc=24.156596533, mode=Mode.PRIVATE)
    fillet2_piece_9a = split(fillet2_piece_9a, bisect_by=Plane(origin=(12.827, 30.536502101, 10.50445679), z_dir=(1, 0, 0)), keep=Keep.TOP, mode=Mode.PRIVATE)
    with BuildSketch(Plane(origin=(12.827, 31.107135894, 6.961277845), x_dir=(0.9839864121726647, -0.17824348700462206, 0), z_dir=(0, 0, 1))) as fillet2_piece_9b_section:
        with BuildLine():
            CenterArc((1.520709788, -1.269935705), FILLET2_R, 89.423465076, 100.843999504)
            Line((0.271047045, -1.496304934), (0, 0))
            ThreePointArc((0, 0), (0.766744431, 0.00385769), (1.533488862, 0))
        make_face()
    fillet2_piece_9b = extrude(amount=10.84244431, mode=Mode.PRIVATE)
    fillet2_piece_9b = split(fillet2_piece_9b, bisect_by=Plane(origin=(13.177108213, 30.693922497, 10.795), z_dir=(0, 0, -1)), keep=Keep.TOP, mode=Mode.PRIVATE)
    fillet2_piece_9 = fillet2_piece_9a & fillet2_piece_9b
    add(fillet2_piece_9, mode=Mode.SUBTRACT)
    with BuildSketch(Plane(origin=(-12.827, 31.107135894, 6.961277845), x_dir=(-0.9839864121726664, -0.17824348700461268, 0), z_dir=(0, 0, 1))) as fillet2_piece_10a_section:
        with BuildLine():
            CenterArc((1.520709788, 1.269935705), FILLET2_R, 169.73253542, 100.843999504)
            Line((0.271047045, 1.496304934), (0, 0))
            ThreePointArc((0, 0), (0.766744431, -0.00385769), (1.533488862, 0))
        make_face()
    fillet2_piece_10a = extrude(amount=10.84244431, mode=Mode.PRIVATE)
    fillet2_piece_10a = split(fillet2_piece_10a, bisect_by=Plane(origin=(-13.177108213, 30.693922497, 10.795), z_dir=(0, 0, -1)), keep=Keep.TOP, mode=Mode.PRIVATE)
    with BuildSketch(Plane(origin=(0, -44.0055, 10.795), x_dir=(0.20924819614640747, 0.9778625631495843, 0), z_dir=(0.9778625631495843, -0.20924819614640747, 0))) as fillet2_piece_10b_section:
        with BuildLine():
            CenterArc((76.2 - FILLET2_R, -FILLET2_R), FILLET2_R, 0, 90)
            Line((76.2 - FILLET2_R, 0), (76.2, 0))
            Line((76.2, 0), (76.2, -FILLET2_R))
        make_face()
    fillet2_piece_10b = revolve(axis=Axis((0, -44.0055, 10.795), (0, 0, 1)), revolution_arc=24.156596533, mode=Mode.PRIVATE)
    fillet2_piece_10b = split(fillet2_piece_10b, bisect_by=Plane(origin=(-12.827, 30.536502326, 10.504456748), z_dir=(-1, 0, 0)), keep=Keep.TOP, mode=Mode.PRIVATE)
    fillet2_piece_10 = fillet2_piece_10a & fillet2_piece_10b
    add(fillet2_piece_10, mode=Mode.SUBTRACT)

    # Sketch11 → Boss-Extrude3 (add)
    with BuildSketch(Plane.XZ.offset(12.7)):
        with Locations((0, -0.3175)):
            Rectangle(SKETCH11_W, SKETCH11_H)
    extrude(amount=-BOSS_EXTRUDE3_DEPTH)


solid = part.part
